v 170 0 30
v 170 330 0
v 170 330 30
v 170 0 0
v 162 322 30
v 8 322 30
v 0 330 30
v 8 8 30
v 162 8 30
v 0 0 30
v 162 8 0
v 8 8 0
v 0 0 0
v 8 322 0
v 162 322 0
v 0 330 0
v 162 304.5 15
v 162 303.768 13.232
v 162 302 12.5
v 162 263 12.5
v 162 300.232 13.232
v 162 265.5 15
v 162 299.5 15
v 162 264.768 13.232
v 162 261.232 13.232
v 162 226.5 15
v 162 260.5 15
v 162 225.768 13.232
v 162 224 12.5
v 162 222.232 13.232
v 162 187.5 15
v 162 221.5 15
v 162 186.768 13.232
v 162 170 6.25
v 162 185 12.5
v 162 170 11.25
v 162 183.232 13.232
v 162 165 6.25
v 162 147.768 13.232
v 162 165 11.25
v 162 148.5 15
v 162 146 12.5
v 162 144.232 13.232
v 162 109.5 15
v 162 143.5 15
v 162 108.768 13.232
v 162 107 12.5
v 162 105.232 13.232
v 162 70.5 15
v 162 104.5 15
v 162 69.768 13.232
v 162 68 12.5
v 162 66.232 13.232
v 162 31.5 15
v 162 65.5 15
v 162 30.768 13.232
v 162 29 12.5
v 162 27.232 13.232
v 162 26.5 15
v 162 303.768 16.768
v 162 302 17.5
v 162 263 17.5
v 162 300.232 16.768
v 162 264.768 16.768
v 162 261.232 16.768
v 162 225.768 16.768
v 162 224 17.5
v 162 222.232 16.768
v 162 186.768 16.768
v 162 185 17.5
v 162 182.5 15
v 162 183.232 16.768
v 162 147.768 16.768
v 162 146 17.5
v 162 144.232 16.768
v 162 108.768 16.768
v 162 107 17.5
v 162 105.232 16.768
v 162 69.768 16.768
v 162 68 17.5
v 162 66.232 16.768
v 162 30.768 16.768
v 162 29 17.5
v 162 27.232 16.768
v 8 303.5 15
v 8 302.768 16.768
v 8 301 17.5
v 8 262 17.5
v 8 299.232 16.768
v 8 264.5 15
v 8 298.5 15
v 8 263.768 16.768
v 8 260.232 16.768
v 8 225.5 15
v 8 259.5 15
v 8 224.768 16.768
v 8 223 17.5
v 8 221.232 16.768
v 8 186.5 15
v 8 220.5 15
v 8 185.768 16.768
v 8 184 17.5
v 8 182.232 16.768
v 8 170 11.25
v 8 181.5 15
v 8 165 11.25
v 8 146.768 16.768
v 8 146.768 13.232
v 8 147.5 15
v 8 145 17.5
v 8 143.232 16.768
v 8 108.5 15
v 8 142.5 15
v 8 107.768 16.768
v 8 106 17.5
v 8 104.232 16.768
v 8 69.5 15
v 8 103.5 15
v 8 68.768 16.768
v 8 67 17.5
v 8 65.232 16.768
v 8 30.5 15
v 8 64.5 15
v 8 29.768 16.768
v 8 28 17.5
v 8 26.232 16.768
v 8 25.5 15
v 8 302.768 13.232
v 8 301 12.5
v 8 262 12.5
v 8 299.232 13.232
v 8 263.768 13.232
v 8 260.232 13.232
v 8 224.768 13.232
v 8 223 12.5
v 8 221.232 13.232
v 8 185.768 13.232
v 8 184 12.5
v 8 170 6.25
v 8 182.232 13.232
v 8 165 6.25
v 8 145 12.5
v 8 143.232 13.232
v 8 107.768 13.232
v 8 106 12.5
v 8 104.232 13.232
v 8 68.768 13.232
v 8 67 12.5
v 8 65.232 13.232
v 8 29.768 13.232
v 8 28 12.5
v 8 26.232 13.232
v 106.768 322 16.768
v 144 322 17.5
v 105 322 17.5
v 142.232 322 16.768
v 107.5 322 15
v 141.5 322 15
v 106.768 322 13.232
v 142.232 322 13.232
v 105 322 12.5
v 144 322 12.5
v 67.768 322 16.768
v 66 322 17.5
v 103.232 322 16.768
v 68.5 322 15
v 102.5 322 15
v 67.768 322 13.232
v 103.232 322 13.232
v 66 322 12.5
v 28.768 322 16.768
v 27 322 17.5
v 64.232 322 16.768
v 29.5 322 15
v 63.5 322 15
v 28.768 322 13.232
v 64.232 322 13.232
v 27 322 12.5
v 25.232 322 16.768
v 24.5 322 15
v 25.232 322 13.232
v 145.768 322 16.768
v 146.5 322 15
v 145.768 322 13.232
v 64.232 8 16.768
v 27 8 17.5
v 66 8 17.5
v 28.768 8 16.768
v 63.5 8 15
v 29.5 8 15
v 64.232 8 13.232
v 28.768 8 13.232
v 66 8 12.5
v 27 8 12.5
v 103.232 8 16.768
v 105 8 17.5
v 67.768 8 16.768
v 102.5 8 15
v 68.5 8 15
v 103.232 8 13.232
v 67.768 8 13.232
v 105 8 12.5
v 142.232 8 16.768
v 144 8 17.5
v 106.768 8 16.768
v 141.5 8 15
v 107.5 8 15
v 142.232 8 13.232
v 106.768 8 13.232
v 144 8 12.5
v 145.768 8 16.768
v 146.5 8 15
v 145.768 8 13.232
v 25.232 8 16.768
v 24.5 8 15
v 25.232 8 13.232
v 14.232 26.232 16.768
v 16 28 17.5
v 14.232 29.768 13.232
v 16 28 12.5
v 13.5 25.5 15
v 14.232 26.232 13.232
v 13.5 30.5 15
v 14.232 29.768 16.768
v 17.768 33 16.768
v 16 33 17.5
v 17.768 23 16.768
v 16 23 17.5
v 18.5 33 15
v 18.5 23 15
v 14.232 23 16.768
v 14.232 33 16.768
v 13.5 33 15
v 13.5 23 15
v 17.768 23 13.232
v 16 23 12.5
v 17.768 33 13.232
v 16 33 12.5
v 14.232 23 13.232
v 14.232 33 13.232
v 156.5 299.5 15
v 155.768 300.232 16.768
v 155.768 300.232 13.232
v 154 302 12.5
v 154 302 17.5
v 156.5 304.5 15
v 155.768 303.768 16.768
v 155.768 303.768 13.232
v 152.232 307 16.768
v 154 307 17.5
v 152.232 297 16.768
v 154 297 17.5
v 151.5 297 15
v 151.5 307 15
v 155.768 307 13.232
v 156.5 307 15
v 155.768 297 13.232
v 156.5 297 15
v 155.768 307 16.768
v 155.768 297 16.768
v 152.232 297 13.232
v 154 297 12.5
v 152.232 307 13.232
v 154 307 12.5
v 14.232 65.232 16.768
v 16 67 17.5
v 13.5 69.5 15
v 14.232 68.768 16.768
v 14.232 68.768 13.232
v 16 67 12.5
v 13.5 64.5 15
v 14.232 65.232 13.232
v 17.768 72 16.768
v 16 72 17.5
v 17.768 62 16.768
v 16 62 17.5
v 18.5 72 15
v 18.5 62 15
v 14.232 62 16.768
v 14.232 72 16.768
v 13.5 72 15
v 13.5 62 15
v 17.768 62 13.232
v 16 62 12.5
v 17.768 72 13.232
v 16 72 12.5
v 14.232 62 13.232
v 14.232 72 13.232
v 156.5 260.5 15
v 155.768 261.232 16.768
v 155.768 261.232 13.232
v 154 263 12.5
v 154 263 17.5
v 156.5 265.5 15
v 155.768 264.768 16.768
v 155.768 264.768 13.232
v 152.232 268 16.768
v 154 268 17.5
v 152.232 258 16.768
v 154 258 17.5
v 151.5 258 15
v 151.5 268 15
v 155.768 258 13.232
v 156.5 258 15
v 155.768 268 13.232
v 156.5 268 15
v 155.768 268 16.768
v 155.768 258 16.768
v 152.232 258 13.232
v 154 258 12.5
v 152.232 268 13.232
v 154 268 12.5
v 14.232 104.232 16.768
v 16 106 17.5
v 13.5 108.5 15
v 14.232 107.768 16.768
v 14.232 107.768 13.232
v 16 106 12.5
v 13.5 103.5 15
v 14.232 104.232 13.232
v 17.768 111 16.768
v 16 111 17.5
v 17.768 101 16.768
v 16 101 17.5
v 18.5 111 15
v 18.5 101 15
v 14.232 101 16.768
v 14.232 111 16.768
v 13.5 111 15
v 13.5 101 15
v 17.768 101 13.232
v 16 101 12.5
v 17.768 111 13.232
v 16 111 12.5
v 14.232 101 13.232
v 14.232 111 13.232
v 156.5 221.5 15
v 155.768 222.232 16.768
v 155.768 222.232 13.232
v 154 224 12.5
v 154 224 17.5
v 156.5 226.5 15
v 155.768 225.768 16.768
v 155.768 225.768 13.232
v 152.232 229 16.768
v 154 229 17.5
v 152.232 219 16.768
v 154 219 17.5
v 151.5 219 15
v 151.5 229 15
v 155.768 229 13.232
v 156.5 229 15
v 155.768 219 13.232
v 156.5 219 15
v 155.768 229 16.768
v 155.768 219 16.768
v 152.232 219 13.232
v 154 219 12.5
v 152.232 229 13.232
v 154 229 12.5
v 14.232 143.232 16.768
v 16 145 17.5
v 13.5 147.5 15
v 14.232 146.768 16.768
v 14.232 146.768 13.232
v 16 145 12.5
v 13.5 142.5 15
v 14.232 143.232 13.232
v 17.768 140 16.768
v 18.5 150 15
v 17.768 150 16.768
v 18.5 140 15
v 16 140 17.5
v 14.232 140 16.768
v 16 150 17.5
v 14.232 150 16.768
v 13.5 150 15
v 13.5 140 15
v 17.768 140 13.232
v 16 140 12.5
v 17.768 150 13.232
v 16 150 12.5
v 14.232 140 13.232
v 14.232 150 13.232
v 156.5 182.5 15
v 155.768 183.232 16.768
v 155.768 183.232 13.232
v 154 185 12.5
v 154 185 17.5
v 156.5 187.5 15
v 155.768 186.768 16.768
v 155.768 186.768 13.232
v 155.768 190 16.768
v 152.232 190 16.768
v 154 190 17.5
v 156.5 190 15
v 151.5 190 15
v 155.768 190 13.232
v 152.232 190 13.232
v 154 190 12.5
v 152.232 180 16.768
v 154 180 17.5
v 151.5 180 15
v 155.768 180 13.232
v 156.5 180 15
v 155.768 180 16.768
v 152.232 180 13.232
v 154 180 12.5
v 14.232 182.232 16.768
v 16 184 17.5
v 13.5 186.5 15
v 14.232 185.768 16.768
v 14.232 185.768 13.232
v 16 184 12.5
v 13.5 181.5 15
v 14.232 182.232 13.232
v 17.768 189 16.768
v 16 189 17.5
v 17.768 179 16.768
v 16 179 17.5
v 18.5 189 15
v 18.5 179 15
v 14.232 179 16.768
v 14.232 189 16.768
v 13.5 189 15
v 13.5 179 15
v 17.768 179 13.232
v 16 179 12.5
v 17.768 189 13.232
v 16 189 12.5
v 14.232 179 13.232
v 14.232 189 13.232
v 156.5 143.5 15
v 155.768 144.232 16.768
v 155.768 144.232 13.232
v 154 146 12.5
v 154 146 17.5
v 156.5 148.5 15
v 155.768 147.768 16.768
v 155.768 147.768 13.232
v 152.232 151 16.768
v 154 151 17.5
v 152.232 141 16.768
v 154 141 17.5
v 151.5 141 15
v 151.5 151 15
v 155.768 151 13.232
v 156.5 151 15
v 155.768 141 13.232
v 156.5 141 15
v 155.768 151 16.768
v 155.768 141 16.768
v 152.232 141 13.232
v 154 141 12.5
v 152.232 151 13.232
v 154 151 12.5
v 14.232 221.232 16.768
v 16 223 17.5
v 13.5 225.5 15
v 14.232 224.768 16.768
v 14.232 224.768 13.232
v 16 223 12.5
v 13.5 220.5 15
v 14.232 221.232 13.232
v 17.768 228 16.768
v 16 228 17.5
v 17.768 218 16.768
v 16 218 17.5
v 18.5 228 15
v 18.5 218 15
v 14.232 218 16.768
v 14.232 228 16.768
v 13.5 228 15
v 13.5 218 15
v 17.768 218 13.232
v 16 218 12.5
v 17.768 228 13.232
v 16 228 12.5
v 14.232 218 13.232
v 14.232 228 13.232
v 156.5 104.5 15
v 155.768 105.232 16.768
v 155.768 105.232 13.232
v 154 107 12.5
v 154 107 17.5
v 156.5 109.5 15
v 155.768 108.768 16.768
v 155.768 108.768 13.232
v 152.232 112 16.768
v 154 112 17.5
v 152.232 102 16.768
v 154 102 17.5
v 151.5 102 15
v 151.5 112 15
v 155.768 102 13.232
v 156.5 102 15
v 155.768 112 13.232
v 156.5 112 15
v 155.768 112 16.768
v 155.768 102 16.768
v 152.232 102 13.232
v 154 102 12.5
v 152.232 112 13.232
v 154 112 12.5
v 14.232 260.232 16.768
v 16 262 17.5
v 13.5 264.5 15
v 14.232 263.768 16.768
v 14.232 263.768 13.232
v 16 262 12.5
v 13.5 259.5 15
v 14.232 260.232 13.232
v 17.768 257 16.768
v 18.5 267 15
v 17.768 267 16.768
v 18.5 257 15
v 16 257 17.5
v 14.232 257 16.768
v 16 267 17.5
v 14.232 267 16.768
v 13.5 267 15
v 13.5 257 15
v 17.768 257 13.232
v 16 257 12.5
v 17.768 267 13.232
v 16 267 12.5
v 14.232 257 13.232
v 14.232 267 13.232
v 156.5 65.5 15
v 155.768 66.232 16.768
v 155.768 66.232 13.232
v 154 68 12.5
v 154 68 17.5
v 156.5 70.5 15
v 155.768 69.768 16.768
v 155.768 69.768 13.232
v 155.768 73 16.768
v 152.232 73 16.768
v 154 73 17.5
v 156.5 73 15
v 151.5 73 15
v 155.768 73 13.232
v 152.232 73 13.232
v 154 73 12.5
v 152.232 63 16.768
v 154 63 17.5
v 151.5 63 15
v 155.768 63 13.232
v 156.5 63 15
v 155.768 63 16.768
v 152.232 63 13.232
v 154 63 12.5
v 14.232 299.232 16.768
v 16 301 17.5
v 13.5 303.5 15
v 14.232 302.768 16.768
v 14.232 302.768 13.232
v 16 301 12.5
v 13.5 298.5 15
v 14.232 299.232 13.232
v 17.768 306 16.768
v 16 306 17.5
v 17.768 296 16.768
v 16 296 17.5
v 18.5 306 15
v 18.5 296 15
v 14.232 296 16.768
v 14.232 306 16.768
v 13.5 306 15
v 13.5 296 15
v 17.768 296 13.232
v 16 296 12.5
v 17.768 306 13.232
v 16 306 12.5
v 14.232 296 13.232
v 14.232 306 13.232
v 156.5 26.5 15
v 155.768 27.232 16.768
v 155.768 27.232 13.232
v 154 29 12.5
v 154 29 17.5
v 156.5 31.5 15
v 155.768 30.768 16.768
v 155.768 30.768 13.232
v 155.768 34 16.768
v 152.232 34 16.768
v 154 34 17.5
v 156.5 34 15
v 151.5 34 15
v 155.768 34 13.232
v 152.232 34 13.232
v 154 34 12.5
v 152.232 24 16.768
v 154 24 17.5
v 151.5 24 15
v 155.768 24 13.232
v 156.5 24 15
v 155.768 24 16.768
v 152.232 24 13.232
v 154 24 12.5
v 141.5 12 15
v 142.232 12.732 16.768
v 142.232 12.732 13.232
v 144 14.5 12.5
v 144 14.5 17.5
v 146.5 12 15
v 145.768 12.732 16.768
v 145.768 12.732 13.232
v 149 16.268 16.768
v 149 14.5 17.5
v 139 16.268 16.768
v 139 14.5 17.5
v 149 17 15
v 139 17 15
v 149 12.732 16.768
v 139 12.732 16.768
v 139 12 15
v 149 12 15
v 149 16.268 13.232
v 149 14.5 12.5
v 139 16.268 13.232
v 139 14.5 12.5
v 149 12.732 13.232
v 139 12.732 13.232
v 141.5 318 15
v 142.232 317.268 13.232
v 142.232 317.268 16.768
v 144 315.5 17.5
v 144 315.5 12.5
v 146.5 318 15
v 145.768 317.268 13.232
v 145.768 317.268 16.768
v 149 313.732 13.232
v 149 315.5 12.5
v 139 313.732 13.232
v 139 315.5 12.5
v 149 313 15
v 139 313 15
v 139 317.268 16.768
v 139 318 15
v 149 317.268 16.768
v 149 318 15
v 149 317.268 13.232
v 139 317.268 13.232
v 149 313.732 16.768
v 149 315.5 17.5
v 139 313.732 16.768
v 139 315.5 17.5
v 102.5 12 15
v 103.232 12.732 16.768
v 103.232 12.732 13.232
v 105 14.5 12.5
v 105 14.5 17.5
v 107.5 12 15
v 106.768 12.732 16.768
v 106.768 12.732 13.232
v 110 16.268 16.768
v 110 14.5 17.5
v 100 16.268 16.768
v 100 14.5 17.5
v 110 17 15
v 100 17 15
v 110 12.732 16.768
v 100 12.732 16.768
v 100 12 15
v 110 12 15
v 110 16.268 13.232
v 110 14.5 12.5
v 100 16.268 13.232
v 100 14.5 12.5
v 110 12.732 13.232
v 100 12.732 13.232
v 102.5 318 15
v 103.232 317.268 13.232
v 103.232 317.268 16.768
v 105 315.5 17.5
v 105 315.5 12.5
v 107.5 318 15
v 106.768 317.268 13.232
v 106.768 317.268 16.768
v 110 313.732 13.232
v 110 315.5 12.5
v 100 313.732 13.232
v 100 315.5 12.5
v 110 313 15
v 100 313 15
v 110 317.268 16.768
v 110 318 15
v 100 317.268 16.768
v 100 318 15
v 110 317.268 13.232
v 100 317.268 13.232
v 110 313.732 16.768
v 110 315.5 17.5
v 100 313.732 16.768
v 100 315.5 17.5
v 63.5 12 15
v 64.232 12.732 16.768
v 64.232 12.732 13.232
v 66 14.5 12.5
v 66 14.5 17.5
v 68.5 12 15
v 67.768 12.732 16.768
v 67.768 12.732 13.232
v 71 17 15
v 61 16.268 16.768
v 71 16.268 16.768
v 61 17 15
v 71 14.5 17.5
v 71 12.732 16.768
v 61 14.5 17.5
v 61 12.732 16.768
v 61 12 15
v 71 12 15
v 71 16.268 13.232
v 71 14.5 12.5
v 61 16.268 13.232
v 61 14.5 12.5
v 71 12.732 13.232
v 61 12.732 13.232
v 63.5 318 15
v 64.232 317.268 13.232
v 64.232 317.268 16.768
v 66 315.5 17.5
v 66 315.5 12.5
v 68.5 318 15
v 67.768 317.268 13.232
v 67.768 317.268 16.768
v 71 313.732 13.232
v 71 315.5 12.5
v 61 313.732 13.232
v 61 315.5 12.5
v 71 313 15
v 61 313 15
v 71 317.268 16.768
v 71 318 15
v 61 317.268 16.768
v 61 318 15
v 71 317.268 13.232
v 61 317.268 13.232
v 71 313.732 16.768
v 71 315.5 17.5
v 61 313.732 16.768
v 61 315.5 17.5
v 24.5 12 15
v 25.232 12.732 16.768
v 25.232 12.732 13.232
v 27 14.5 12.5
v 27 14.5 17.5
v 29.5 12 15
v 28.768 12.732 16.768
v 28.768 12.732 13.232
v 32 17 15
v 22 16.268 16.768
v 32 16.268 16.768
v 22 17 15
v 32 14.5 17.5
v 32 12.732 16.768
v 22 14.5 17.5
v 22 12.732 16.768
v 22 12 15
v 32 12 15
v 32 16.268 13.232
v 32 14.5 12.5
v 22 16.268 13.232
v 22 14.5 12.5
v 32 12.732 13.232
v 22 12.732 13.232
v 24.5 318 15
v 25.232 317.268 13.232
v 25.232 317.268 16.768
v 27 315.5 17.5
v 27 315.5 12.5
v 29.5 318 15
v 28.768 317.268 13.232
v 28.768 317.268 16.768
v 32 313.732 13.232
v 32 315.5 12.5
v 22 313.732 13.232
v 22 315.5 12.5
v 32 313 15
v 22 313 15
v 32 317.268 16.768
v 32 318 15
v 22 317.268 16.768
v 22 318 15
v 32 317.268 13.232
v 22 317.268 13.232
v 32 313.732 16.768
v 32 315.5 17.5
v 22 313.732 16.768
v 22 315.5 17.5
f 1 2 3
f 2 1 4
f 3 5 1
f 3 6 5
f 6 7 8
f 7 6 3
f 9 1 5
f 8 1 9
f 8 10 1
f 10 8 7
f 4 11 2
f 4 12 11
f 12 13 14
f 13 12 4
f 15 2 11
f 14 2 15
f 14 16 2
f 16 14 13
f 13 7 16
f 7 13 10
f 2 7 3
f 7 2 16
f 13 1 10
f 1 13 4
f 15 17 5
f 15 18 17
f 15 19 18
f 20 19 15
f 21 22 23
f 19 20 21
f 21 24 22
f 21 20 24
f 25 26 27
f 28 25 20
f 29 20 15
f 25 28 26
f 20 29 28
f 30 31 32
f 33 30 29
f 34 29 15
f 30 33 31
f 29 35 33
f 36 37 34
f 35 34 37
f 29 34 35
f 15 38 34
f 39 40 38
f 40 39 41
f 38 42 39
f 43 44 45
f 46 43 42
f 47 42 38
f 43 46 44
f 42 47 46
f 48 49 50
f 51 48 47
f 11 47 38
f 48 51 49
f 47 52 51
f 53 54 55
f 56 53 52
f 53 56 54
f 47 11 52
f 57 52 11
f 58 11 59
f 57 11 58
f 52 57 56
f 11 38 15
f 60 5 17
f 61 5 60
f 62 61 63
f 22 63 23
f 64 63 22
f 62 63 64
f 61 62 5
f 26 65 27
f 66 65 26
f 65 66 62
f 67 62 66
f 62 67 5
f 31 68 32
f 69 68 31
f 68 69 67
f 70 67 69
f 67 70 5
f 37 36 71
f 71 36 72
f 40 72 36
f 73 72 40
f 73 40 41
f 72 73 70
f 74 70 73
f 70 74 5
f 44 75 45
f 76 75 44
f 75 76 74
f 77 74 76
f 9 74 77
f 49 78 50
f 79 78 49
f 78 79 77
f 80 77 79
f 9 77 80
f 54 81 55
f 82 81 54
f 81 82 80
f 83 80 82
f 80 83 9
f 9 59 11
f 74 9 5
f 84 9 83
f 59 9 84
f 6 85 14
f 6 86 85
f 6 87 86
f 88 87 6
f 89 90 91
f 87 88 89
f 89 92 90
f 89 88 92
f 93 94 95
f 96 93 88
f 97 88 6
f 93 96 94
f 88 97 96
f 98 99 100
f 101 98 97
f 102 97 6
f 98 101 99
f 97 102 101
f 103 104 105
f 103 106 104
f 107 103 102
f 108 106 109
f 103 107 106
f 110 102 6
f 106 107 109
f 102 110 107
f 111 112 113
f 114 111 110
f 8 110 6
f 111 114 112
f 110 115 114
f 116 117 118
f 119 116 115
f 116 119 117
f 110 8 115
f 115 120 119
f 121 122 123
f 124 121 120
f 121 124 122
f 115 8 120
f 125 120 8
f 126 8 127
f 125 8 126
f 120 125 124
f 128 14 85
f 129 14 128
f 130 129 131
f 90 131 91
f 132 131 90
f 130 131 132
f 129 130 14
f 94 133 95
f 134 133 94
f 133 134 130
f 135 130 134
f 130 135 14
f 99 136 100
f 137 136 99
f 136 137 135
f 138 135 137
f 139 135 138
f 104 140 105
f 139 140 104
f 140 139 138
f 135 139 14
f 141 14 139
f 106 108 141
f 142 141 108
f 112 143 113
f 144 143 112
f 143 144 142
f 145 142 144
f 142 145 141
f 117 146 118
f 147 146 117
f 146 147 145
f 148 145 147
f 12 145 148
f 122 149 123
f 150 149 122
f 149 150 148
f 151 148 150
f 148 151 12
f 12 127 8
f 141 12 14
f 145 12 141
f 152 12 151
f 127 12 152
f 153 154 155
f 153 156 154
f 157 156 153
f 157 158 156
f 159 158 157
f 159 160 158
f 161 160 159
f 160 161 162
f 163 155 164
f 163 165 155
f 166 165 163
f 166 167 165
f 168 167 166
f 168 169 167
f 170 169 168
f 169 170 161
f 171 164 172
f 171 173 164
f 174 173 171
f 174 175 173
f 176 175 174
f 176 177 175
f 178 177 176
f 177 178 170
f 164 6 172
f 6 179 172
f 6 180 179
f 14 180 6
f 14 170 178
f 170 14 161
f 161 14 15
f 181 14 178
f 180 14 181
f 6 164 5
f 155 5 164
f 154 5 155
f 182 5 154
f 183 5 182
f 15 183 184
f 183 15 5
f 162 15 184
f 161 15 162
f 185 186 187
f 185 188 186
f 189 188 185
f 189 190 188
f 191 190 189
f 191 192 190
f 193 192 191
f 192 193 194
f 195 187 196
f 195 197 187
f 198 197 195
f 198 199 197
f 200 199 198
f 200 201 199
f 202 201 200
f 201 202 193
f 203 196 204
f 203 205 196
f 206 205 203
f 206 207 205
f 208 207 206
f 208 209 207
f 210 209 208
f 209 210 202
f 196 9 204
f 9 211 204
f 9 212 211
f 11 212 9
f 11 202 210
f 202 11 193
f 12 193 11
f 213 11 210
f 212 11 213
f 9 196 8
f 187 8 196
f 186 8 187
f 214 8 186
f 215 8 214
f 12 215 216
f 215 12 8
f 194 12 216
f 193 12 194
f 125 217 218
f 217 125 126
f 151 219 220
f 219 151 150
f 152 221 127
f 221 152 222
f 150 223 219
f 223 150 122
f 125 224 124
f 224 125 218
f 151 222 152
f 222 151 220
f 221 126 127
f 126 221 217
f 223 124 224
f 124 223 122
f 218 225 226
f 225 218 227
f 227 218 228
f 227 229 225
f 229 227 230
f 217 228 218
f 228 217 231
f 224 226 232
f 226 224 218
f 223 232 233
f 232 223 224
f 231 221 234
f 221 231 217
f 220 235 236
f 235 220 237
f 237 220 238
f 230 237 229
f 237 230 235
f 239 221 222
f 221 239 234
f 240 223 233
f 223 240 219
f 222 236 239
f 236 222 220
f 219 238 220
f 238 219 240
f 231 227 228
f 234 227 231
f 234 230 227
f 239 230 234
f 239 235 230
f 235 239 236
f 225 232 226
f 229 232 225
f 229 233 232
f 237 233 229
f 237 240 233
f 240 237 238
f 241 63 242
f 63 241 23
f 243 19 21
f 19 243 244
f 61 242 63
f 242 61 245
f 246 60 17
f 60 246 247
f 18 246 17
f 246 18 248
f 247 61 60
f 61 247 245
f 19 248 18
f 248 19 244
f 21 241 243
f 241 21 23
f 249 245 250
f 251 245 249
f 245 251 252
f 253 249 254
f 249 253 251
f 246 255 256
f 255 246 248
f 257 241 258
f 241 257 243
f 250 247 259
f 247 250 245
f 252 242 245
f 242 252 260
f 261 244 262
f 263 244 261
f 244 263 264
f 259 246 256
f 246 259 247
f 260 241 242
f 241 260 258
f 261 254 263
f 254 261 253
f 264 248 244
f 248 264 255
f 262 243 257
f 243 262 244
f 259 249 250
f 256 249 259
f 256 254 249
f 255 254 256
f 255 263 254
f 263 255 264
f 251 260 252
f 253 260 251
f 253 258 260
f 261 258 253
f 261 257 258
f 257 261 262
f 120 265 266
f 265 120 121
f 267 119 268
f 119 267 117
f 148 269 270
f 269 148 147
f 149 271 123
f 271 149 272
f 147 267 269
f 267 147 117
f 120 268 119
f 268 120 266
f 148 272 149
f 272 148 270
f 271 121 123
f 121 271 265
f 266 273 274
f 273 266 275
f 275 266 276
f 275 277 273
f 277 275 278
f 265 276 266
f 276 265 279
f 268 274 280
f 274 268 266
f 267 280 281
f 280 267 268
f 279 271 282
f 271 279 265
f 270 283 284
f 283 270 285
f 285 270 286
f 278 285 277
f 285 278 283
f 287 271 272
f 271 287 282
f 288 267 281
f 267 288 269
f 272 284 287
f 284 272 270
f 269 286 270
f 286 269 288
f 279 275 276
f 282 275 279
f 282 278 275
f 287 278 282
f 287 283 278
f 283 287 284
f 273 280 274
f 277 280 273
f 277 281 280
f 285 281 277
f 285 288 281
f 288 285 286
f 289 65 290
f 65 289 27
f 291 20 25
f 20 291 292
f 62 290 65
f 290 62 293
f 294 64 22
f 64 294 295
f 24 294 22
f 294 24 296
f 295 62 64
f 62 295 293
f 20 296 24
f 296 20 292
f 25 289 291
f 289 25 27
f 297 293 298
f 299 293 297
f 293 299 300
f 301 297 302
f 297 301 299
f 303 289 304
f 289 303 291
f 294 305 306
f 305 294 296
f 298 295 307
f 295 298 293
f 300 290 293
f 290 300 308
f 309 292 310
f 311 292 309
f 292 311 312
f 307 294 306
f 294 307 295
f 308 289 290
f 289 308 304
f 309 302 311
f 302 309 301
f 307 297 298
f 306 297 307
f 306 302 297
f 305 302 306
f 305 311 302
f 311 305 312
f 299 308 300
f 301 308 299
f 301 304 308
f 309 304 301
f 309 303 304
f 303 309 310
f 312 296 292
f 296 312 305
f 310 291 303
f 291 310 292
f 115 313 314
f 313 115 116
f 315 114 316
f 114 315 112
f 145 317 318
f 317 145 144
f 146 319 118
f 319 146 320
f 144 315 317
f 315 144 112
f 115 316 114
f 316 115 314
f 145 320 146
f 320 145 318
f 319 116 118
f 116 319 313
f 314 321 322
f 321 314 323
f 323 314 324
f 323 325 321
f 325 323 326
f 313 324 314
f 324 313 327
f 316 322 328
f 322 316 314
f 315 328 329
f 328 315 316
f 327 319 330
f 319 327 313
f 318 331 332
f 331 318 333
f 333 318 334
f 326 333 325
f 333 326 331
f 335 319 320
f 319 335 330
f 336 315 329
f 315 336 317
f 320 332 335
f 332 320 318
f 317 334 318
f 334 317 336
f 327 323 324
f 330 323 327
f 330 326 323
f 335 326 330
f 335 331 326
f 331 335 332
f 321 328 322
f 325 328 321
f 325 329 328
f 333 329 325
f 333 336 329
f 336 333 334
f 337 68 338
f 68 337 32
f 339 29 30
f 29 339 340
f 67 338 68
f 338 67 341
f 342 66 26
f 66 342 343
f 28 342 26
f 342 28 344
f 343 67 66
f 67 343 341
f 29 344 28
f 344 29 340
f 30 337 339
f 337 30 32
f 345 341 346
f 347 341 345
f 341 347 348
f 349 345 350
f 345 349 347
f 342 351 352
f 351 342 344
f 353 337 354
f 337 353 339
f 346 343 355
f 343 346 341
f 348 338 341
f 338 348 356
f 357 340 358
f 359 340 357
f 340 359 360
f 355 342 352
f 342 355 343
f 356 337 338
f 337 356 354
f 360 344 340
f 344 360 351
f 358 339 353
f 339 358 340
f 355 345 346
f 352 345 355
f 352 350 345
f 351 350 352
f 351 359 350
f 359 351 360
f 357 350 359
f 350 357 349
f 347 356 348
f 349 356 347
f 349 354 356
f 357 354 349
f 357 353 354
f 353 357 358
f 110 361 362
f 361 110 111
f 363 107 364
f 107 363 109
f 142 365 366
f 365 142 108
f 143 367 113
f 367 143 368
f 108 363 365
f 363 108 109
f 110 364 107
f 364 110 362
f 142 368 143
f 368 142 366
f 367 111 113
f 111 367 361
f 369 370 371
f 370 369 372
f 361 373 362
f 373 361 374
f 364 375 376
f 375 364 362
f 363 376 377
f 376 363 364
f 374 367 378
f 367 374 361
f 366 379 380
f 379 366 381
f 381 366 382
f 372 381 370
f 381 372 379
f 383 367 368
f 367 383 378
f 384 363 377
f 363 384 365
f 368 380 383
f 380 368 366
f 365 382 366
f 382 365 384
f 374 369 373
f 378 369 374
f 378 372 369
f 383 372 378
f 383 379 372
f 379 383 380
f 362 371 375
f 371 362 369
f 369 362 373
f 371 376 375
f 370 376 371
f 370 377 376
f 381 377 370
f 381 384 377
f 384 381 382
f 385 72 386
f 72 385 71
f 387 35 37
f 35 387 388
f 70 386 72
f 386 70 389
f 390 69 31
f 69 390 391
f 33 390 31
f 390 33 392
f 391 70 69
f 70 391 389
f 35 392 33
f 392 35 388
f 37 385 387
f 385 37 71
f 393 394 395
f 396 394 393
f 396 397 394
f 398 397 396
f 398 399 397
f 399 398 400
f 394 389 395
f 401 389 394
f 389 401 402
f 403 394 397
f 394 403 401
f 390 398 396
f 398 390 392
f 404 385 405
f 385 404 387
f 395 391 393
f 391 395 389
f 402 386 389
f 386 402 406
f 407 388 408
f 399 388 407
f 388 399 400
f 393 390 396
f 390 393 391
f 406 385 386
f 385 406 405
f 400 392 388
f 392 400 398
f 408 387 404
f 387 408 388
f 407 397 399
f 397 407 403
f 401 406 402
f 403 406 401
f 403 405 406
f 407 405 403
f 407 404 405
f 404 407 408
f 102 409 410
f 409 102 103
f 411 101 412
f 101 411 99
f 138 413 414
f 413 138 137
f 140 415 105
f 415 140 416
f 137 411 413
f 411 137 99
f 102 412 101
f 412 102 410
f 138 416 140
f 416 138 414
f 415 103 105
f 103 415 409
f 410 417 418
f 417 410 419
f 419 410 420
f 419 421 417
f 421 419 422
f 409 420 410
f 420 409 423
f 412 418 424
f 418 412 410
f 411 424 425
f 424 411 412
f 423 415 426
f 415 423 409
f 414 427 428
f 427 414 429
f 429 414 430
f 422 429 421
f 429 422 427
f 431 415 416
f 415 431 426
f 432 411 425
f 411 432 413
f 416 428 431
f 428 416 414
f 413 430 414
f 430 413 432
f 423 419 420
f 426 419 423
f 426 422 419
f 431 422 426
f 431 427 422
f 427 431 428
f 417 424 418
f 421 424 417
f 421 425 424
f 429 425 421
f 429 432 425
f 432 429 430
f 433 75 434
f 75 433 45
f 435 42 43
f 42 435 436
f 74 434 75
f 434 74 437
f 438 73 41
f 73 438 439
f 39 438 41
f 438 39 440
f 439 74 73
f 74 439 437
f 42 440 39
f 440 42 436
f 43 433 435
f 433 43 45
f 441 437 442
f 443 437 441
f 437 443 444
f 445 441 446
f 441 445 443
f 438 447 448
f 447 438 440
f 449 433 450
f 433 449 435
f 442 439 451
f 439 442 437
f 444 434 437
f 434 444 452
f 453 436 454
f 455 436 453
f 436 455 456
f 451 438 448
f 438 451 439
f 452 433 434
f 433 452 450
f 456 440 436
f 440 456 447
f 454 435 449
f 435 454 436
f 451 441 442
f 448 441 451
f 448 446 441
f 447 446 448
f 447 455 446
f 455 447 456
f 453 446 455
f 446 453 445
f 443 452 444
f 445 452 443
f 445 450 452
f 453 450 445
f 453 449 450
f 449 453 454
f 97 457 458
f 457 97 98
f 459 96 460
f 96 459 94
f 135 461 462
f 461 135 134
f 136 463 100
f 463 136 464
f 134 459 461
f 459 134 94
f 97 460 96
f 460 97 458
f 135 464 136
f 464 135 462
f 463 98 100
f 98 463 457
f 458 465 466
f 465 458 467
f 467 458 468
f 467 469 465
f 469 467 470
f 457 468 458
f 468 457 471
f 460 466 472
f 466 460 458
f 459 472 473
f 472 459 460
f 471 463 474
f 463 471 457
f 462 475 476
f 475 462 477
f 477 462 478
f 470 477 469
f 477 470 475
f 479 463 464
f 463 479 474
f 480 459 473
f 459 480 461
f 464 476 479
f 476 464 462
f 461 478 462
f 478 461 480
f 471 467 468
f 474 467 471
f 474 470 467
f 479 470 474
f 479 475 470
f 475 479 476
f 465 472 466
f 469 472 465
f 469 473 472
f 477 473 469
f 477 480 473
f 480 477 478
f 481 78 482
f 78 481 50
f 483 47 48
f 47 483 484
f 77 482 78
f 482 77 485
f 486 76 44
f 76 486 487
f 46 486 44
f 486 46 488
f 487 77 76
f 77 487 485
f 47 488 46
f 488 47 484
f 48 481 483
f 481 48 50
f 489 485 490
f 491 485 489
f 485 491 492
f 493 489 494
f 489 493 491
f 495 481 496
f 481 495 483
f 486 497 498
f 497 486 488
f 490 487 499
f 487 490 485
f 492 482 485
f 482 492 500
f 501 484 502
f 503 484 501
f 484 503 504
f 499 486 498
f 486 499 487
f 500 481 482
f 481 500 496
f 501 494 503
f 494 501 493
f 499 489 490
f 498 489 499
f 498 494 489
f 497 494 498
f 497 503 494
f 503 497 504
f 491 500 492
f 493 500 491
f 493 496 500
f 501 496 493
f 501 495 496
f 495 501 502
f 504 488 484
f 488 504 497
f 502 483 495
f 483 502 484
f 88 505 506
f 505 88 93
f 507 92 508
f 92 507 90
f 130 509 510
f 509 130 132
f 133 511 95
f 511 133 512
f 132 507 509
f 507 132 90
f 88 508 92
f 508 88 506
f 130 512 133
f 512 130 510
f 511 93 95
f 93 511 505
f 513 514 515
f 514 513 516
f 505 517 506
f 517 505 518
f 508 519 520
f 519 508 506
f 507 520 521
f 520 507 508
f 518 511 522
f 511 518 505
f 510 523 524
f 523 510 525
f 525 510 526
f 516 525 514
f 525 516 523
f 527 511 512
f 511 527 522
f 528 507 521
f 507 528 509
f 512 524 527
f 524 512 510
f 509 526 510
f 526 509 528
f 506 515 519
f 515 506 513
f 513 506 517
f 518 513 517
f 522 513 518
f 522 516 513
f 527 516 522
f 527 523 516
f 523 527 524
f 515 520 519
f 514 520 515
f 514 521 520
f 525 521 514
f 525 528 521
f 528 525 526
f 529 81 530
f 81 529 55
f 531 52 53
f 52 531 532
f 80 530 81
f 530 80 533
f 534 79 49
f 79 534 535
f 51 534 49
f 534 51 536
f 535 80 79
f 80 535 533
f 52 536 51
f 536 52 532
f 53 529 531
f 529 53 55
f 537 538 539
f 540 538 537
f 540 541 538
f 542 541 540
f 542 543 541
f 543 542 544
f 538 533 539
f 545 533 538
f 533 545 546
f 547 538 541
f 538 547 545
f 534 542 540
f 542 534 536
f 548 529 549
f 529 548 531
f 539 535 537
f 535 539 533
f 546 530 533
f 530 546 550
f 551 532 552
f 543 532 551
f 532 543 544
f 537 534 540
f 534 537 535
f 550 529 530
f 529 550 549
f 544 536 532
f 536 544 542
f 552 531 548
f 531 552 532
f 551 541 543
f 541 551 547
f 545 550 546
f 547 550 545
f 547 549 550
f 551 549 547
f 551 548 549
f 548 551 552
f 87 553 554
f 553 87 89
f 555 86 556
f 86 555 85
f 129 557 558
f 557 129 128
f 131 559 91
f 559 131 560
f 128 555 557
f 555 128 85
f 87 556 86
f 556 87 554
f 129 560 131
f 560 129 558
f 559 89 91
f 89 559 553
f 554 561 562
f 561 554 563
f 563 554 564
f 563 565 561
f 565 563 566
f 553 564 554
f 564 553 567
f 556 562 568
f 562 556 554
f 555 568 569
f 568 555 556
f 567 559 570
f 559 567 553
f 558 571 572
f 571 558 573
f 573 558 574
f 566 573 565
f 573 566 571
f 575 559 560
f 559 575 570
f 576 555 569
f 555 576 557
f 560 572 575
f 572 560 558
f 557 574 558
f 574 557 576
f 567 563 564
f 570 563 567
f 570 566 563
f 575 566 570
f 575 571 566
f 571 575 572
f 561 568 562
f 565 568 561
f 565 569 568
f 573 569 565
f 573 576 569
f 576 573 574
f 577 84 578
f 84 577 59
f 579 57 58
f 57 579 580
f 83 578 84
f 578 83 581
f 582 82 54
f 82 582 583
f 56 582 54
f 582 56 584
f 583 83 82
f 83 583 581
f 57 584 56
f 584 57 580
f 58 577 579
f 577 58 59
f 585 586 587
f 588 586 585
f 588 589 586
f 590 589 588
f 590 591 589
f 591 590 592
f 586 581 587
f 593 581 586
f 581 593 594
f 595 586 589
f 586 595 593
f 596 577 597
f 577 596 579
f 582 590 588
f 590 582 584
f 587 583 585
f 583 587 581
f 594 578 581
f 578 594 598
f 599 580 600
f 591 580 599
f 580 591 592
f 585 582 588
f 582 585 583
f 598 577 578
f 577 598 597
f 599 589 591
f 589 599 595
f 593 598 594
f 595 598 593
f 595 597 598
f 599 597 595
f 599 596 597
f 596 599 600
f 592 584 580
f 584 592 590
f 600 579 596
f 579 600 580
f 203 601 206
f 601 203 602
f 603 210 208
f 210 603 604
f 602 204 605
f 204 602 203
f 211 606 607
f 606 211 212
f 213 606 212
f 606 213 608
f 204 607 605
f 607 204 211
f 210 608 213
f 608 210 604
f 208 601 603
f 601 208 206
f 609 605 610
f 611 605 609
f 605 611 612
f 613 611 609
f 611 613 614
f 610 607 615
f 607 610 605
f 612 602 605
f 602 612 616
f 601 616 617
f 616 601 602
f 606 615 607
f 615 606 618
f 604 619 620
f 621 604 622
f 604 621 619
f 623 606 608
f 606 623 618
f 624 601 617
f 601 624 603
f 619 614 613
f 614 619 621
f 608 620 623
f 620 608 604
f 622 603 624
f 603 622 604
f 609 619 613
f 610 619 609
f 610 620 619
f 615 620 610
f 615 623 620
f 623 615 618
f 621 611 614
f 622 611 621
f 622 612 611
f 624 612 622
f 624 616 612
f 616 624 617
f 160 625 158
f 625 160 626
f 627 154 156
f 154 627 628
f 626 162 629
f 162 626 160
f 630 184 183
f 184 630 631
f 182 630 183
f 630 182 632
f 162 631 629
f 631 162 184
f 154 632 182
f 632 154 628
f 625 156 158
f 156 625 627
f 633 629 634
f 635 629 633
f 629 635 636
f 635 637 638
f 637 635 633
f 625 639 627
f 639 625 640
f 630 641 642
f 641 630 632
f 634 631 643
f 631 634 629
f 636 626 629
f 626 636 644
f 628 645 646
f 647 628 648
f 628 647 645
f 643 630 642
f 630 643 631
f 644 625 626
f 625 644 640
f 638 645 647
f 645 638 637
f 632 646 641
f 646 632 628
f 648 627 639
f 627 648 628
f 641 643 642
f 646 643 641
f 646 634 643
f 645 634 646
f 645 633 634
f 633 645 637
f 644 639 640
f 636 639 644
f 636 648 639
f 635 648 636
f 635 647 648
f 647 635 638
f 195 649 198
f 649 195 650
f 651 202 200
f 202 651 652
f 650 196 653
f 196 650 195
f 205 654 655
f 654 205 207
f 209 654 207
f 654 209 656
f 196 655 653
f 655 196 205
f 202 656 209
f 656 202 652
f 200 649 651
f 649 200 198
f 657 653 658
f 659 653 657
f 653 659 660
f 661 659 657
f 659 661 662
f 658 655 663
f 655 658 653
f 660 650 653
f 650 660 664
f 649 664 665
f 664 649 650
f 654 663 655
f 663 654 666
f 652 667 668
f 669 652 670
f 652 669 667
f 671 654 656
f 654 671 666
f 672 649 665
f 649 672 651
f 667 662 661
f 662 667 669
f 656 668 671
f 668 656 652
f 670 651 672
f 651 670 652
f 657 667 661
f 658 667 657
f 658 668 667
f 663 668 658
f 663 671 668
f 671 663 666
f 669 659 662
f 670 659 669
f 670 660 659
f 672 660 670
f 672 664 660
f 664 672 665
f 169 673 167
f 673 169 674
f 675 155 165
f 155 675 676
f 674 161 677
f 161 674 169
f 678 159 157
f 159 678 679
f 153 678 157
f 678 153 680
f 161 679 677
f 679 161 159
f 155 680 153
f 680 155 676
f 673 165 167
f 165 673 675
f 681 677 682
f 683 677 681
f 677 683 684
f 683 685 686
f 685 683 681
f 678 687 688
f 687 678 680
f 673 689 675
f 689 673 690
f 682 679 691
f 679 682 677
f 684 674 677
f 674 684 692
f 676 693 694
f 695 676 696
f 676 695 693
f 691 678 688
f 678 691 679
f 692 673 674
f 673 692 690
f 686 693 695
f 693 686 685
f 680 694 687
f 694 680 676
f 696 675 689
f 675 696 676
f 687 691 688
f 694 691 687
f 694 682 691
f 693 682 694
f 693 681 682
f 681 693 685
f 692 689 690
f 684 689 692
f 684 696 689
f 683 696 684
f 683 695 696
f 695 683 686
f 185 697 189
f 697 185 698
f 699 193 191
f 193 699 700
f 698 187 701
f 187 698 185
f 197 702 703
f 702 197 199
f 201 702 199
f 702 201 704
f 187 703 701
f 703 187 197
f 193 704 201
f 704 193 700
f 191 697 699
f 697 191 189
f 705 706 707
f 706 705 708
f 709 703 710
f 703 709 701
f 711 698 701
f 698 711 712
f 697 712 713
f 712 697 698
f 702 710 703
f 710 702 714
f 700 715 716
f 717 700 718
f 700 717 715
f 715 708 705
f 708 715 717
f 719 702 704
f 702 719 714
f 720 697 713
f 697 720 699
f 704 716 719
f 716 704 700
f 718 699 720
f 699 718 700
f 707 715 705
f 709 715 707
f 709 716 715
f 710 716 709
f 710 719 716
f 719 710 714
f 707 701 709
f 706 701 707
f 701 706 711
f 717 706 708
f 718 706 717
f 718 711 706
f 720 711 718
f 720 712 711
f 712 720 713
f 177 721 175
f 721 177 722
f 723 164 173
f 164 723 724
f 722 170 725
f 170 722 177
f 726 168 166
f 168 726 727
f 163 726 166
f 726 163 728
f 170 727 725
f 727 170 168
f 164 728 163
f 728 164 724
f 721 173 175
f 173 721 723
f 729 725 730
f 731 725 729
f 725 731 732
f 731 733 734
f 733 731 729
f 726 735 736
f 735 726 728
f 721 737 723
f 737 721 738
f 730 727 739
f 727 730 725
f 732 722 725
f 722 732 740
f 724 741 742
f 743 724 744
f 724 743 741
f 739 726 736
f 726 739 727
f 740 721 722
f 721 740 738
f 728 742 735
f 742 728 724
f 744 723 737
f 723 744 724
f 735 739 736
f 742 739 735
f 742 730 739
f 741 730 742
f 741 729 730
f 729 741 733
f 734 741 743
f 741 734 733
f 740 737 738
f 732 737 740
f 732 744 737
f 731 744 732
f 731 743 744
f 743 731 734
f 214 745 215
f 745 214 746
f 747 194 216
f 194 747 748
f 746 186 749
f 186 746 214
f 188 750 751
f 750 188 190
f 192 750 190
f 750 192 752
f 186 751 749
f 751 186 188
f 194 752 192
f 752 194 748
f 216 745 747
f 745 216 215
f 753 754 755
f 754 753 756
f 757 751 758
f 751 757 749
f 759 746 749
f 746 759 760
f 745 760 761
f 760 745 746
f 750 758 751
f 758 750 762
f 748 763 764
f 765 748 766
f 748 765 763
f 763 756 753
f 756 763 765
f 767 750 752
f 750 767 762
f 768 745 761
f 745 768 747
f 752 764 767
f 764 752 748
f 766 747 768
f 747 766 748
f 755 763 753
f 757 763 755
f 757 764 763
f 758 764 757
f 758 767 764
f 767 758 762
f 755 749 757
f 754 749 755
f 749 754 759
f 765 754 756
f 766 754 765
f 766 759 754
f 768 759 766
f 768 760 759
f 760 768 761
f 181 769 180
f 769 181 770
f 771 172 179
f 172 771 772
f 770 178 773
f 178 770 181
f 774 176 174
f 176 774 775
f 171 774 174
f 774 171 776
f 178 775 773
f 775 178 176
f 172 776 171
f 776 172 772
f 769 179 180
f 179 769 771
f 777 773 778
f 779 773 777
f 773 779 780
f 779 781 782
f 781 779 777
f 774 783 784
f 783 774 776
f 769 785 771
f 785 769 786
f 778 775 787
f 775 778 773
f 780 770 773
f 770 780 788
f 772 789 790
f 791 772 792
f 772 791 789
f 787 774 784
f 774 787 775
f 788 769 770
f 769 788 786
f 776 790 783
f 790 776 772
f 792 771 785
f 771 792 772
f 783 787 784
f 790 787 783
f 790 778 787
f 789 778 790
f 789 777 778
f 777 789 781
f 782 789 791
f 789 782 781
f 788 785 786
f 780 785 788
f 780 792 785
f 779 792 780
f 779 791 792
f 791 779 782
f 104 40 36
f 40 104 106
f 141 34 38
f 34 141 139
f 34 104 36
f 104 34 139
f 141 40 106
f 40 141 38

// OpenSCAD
filter_width = 170; 
filter_height = 30; 
filter_depth = 330;
frame_thickness = 8;
hook_length = 8;
hook_thickness = 5;
hook_end_width = hook_thickness * 2;
hook_spacing_width = 39;
hook_spacing_depth = 39;
hook_offset_width = 18;
hook_offset_depth = 20;
middle_bar_thickness = 5;

module hook(x, y) {
    translate([x, y, filter_height / 2])
        rotate([0, 90, 0]) 
        cylinder(hook_length, hook_thickness / 2, hook_thickness / 2, $fn=8);
    translate([x + hook_length, y + hook_end_width / 2, (filter_height) / 2])
        rotate([90, 0, 0]) 
        cylinder(hook_end_width, hook_thickness / 2, hook_thickness / 2, $fn=8);
}

difference(){
    cube([filter_width, filter_depth, filter_height]);
    translate([frame_thickness, frame_thickness, 0])
        cube([
            filter_width - frame_thickness * 2, 
            filter_depth - frame_thickness * 2, 
            filter_height]
        );
}

translate([frame_thickness, filter_depth / 2, (filter_height - middle_bar_thickness) / 4])
    cube([filter_width - frame_thickness * 2, middle_bar_thickness, middle_bar_thickness]);

for (y = [frame_thickness + hook_offset_depth : hook_spacing_depth : filter_depth]) {
    hook(frame_thickness, y);
    rotate([180, 180, 0])
        hook(-filter_width + frame_thickness, y - filter_depth);
}

for (x = [frame_thickness + hook_offset_width : hook_spacing_width : filter_width]) {
    rotate([0, 0, 90]) 
        hook(frame_thickness / 2 + filter_width - filter_depth / 2 -hook_thickness / 2, 
             x - filter_width);
    rotate([0, 180, 90])
        translate([0, 0, -filter_height])
        hook(frame_thickness / 2 + filter_width - filter_depth / 2 * 3 -hook_thickness / 2, 
             x - filter_width);
}
